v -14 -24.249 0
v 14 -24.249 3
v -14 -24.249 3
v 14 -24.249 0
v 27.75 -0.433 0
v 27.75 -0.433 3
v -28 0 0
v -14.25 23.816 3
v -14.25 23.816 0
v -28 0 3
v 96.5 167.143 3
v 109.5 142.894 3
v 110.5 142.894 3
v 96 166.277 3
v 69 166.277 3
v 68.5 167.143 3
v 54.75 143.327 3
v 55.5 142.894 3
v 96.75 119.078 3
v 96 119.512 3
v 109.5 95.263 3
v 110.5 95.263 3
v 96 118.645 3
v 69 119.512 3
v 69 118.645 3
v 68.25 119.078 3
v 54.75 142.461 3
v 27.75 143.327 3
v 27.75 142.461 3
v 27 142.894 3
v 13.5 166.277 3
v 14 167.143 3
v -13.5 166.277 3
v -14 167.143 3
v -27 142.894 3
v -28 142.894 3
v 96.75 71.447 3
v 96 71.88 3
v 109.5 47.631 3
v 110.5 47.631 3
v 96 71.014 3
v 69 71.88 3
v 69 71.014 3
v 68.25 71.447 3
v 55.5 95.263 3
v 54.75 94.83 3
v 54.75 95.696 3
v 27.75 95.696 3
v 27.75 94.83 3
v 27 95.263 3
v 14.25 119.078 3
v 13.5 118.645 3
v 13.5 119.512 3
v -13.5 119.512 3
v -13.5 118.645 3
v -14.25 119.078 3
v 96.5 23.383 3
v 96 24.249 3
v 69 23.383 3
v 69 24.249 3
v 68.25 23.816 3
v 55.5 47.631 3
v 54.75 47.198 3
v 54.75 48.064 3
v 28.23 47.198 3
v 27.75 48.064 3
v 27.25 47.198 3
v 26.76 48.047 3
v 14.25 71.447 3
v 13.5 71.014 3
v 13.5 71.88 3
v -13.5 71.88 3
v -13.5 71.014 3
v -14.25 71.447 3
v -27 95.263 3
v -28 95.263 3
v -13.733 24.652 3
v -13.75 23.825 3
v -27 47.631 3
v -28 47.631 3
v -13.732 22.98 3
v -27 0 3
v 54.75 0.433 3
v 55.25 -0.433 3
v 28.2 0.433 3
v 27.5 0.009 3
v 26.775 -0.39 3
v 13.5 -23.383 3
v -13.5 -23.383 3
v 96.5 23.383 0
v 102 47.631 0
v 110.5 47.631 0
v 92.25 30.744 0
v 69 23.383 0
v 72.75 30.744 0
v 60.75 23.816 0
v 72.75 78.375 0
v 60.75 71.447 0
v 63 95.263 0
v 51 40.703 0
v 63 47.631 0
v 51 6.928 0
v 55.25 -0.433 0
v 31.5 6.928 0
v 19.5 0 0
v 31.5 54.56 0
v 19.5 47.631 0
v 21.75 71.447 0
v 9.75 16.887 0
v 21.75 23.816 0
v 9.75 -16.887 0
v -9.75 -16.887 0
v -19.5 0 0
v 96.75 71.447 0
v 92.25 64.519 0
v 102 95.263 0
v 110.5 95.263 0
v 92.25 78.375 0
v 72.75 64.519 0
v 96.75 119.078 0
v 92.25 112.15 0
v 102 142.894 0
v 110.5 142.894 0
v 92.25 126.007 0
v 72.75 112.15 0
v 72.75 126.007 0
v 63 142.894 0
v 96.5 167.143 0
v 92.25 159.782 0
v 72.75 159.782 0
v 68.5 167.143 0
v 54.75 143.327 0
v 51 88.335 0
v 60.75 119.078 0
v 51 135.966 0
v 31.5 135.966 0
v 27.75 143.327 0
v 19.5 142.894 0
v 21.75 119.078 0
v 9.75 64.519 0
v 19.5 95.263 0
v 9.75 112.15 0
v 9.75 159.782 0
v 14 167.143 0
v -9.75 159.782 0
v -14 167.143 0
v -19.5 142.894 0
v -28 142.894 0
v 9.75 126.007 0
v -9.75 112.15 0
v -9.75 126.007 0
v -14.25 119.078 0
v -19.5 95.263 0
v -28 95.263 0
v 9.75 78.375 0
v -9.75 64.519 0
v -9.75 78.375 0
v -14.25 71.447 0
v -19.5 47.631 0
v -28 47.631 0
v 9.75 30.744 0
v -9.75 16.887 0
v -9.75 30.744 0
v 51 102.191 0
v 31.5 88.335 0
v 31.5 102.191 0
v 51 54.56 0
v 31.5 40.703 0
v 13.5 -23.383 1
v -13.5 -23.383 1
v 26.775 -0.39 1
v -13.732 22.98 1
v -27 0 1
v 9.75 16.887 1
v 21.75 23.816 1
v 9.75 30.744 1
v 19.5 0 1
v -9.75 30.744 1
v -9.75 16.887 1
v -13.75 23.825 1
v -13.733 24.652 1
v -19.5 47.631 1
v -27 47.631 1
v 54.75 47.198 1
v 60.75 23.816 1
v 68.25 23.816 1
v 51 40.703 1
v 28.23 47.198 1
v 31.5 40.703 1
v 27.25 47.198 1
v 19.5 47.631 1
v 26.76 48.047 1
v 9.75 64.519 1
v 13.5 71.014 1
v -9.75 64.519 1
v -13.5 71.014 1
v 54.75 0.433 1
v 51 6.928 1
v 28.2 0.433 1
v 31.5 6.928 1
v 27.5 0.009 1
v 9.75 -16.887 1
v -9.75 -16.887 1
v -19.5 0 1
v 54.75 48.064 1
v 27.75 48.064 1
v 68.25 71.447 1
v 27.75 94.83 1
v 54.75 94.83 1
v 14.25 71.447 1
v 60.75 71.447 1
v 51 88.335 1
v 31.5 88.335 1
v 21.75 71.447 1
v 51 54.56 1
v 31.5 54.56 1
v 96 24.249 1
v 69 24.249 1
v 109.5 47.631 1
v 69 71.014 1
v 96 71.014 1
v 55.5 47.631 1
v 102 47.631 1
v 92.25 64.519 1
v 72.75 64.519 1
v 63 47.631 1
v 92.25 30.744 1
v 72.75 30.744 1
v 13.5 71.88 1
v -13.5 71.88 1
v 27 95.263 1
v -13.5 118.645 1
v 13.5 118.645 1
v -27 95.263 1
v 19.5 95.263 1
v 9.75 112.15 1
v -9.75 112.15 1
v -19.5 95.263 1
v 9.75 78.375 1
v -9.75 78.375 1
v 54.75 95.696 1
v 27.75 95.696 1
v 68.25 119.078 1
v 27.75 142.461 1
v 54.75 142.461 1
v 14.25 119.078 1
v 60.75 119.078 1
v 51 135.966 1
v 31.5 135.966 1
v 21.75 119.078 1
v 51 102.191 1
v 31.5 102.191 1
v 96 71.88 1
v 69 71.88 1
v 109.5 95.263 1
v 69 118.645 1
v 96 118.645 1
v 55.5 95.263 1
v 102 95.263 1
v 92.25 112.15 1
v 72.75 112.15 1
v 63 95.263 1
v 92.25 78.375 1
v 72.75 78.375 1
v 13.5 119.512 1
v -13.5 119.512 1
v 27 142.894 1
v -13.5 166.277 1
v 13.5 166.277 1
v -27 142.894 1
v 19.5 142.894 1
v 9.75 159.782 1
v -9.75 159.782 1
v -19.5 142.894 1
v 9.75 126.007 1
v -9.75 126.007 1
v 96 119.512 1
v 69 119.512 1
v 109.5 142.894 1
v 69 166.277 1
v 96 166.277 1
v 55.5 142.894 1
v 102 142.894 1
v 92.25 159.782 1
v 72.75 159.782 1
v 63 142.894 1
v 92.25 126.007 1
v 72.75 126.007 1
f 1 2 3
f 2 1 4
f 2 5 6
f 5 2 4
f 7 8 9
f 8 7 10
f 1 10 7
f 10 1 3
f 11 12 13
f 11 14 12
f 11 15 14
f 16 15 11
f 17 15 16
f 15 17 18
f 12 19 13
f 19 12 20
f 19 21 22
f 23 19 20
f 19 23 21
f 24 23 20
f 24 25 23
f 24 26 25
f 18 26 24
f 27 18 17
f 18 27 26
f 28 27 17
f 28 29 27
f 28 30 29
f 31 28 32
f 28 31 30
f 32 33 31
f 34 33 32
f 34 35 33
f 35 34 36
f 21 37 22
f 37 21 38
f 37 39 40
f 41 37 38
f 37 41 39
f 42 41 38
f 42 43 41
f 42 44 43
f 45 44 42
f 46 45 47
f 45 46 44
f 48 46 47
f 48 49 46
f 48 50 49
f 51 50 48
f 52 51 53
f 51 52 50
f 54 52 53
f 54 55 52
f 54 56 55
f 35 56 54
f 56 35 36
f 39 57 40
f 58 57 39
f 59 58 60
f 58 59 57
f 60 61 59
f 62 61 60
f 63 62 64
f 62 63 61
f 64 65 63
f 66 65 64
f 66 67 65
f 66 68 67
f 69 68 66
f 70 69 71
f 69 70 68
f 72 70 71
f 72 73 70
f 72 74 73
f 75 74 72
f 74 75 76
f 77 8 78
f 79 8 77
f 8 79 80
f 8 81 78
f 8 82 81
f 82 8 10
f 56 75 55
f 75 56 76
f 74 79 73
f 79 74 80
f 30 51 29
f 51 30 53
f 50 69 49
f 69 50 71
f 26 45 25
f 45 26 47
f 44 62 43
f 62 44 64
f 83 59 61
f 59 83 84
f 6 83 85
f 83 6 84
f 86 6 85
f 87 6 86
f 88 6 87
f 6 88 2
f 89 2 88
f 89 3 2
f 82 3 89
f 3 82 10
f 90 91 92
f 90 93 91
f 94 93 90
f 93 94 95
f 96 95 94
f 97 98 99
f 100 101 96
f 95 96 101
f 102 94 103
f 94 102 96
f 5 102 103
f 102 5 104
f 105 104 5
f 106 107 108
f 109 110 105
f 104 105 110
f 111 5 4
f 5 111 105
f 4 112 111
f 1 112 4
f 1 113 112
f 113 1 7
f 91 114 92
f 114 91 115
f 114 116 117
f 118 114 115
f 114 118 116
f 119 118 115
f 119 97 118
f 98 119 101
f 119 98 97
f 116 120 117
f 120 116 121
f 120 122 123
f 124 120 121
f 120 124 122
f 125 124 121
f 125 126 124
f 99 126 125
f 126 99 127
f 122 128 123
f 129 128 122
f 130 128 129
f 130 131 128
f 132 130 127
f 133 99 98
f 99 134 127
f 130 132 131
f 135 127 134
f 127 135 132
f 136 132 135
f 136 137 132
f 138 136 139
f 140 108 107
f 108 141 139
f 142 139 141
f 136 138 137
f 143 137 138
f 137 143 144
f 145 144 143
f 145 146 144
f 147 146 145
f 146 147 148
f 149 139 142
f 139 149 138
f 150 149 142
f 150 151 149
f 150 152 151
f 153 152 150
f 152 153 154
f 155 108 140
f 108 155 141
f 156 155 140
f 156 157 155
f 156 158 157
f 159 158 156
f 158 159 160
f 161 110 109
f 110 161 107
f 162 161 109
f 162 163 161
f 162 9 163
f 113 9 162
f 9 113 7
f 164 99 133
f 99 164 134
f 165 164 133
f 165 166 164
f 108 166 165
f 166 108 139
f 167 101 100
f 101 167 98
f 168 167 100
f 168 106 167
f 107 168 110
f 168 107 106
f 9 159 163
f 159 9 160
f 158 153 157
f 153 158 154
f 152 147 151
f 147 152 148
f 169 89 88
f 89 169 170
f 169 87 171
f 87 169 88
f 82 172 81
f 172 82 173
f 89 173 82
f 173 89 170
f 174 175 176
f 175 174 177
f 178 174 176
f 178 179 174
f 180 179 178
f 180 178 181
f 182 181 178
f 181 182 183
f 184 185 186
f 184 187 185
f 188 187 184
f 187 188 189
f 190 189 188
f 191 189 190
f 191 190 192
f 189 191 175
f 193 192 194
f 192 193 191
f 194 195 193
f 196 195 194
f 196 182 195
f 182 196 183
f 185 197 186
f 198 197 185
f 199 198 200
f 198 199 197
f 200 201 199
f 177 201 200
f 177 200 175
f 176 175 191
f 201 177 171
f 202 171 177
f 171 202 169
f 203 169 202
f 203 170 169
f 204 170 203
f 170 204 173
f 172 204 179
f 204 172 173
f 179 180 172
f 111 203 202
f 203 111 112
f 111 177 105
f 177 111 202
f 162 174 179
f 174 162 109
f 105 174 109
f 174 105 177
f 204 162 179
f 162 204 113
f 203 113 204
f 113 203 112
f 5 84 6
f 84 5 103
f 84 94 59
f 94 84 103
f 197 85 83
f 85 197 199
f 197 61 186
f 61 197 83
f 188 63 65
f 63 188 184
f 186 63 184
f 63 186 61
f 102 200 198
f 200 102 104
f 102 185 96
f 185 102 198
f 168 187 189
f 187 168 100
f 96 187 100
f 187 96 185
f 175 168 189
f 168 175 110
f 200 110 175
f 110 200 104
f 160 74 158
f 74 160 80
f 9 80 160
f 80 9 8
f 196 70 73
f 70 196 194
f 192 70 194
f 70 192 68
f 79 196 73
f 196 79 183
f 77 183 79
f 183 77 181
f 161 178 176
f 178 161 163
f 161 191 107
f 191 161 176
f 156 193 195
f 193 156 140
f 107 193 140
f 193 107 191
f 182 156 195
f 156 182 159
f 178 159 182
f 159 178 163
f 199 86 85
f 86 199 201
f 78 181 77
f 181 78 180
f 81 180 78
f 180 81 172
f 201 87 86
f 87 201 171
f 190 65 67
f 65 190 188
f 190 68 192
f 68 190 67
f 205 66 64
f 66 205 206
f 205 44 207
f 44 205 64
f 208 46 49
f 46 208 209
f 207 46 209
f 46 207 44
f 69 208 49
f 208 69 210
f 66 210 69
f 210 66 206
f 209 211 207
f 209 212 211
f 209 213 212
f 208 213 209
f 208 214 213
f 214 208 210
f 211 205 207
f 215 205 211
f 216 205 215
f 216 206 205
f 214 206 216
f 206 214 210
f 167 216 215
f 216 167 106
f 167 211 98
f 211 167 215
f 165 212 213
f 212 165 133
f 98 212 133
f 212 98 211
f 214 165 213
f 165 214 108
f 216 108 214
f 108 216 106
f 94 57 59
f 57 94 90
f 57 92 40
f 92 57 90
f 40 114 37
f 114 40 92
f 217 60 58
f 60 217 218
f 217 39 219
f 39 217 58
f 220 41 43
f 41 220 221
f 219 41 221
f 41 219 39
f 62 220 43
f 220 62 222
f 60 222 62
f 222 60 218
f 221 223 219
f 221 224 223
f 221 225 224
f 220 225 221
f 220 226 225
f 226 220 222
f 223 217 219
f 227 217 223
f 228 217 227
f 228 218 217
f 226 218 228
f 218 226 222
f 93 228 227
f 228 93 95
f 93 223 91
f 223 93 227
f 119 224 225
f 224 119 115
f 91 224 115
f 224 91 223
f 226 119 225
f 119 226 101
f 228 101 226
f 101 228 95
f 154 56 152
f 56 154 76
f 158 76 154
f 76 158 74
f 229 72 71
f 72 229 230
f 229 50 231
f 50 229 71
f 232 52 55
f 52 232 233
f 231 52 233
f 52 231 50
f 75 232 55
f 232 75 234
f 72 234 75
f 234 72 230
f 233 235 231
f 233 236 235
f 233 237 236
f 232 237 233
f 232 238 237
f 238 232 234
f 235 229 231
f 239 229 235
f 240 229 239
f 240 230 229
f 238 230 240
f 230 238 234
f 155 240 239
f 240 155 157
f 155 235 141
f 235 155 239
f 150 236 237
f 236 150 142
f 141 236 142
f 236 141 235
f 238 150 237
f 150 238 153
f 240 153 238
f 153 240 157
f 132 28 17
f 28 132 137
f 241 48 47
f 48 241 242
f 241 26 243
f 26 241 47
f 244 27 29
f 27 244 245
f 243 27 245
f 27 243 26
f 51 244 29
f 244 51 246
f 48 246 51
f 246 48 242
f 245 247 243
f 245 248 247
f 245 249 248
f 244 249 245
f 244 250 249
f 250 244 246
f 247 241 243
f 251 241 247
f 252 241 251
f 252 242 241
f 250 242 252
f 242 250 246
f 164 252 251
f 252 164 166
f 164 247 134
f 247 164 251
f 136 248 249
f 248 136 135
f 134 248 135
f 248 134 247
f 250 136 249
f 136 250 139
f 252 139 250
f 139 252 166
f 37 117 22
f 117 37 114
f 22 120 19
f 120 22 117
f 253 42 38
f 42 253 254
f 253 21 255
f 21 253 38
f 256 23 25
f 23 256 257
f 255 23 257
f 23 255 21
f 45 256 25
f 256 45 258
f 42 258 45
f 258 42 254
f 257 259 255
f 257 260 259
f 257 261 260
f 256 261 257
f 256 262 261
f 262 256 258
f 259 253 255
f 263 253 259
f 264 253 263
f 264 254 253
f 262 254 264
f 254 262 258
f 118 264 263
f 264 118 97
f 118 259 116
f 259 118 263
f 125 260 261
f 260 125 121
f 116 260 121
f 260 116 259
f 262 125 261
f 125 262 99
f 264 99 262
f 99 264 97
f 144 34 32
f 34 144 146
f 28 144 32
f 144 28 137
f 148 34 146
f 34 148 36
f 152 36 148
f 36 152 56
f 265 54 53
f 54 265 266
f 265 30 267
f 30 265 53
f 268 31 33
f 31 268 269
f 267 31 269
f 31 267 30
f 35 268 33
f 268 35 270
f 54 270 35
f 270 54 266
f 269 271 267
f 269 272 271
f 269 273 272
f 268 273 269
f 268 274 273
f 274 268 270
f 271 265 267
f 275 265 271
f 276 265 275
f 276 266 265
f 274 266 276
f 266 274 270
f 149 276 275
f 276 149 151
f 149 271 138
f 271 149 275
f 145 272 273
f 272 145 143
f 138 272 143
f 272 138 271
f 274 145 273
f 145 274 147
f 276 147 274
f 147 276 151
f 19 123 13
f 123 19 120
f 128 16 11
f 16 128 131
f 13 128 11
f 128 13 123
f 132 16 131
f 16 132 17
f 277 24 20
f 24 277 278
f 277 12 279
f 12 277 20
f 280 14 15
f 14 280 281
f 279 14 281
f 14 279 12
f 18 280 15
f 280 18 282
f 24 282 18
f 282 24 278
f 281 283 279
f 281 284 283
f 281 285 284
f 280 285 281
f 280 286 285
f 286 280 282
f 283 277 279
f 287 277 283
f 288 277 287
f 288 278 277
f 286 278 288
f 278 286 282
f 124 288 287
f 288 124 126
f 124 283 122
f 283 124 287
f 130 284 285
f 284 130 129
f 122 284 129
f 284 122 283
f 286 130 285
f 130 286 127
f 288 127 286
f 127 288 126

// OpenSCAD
$fn = 150;

union() {
	difference() {
		union() {
			translate(v = [0.0, 0.0, 0]) {
				difference() {
					cylinder($fn = 6, d = 56.0, h = 3.0);
					translate(v = [0, 0, 1.0]) {
						cylinder($fn = 6, d = 54.0, h = 3.0);
					}
					translate(v = [0, 0, -1]) {
						cylinder($fn = 6, d = 39, h = 3.0);
					}
				}
			}
			translate(v = [41.25, 23.81569860407206, 0]) {
				difference() {
					cylinder($fn = 6, d = 56.0, h = 3.0);
					translate(v = [0, 0, 1.0]) {
						cylinder($fn = 6, d = 54.0, h = 3.0);
					}
					translate(v = [0, 0, -1]) {
						cylinder($fn = 6, d = 39, h = 3.0);
					}
				}
			}
			translate(v = [0.0, 47.63139720814412, 0]) {
				difference() {
					cylinder($fn = 6, d = 56.0, h = 3.0);
					translate(v = [0, 0, 1.0]) {
						cylinder($fn = 6, d = 54.0, h = 3.0);
					}
					translate(v = [0, 0, -1]) {
						cylinder($fn = 6, d = 39, h = 3.0);
					}
				}
			}
		}
		translate(v = [13.75, 23.824673200287624, 1.0]) {
			cylinder(d = 55.0, h = 3.5);
		}
	}
	translate(v = [41.25, 71.44709581221619, 0]) {
		difference() {
			cylinder($fn = 6, d = 56.0, h = 3.0);
			translate(v = [0, 0, 1.0]) {
				cylinder($fn = 6, d = 54.0, h = 3.0);
			}
			translate(v = [0, 0, -1]) {
				cylinder($fn = 6, d = 39, h = 3.0);
			}
		}
	}
	translate(v = [82.5, 47.63139720814412, 0]) {
		difference() {
			cylinder($fn = 6, d = 56.0, h = 3.0);
			translate(v = [0, 0, 1.0]) {
				cylinder($fn = 6, d = 54.0, h = 3.0);
			}
			translate(v = [0, 0, -1]) {
				cylinder($fn = 6, d = 39, h = 3.0);
			}
		}
	}
	translate(v = [0.0, 95.26279441628824, 0]) {
		difference() {
			cylinder($fn = 6, d = 56.0, h = 3.0);
			translate(v = [0, 0, 1.0]) {
				cylinder($fn = 6, d = 54.0, h = 3.0);
			}
			translate(v = [0, 0, -1]) {
				cylinder($fn = 6, d = 39, h = 3.0);
			}
		}
	}
	translate(v = [41.25, 119.0784930203603, 0]) {
		difference() {
			cylinder($fn = 6, d = 56.0, h = 3.0);
			translate(v = [0, 0, 1.0]) {
				cylinder($fn = 6, d = 54.0, h = 3.0);
			}
			translate(v = [0, 0, -1]) {
				cylinder($fn = 6, d = 39, h = 3.0);
			}
		}
	}
	translate(v = [82.5, 95.26279441628824, 0]) {
		difference() {
			cylinder($fn = 6, d = 56.0, h = 3.0);
			translate(v = [0, 0, 1.0]) {
				cylinder($fn = 6, d = 54.0, h = 3.0);
			}
			translate(v = [0, 0, -1]) {
				cylinder($fn = 6, d = 39, h = 3.0);
			}
		}
	}
	translate(v = [0.0, 142.89419162443238, 0]) {
		difference() {
			cylinder($fn = 6, d = 56.0, h = 3.0);
			translate(v = [0, 0, 1.0]) {
				cylinder($fn = 6, d = 54.0, h = 3.0);
			}
			translate(v = [0, 0, -1]) {
				cylinder($fn = 6, d = 39, h = 3.0);
			}
		}
	}
	translate(v = [82.5, 142.89419162443238, 0]) {
		difference() {
			cylinder($fn = 6, d = 56.0, h = 3.0);
			translate(v = [0, 0, 1.0]) {
				cylinder($fn = 6, d = 54.0, h = 3.0);
			}
			translate(v = [0, 0, -1]) {
				cylinder($fn = 6, d = 39, h = 3.0);
			}
		}
	}
}
